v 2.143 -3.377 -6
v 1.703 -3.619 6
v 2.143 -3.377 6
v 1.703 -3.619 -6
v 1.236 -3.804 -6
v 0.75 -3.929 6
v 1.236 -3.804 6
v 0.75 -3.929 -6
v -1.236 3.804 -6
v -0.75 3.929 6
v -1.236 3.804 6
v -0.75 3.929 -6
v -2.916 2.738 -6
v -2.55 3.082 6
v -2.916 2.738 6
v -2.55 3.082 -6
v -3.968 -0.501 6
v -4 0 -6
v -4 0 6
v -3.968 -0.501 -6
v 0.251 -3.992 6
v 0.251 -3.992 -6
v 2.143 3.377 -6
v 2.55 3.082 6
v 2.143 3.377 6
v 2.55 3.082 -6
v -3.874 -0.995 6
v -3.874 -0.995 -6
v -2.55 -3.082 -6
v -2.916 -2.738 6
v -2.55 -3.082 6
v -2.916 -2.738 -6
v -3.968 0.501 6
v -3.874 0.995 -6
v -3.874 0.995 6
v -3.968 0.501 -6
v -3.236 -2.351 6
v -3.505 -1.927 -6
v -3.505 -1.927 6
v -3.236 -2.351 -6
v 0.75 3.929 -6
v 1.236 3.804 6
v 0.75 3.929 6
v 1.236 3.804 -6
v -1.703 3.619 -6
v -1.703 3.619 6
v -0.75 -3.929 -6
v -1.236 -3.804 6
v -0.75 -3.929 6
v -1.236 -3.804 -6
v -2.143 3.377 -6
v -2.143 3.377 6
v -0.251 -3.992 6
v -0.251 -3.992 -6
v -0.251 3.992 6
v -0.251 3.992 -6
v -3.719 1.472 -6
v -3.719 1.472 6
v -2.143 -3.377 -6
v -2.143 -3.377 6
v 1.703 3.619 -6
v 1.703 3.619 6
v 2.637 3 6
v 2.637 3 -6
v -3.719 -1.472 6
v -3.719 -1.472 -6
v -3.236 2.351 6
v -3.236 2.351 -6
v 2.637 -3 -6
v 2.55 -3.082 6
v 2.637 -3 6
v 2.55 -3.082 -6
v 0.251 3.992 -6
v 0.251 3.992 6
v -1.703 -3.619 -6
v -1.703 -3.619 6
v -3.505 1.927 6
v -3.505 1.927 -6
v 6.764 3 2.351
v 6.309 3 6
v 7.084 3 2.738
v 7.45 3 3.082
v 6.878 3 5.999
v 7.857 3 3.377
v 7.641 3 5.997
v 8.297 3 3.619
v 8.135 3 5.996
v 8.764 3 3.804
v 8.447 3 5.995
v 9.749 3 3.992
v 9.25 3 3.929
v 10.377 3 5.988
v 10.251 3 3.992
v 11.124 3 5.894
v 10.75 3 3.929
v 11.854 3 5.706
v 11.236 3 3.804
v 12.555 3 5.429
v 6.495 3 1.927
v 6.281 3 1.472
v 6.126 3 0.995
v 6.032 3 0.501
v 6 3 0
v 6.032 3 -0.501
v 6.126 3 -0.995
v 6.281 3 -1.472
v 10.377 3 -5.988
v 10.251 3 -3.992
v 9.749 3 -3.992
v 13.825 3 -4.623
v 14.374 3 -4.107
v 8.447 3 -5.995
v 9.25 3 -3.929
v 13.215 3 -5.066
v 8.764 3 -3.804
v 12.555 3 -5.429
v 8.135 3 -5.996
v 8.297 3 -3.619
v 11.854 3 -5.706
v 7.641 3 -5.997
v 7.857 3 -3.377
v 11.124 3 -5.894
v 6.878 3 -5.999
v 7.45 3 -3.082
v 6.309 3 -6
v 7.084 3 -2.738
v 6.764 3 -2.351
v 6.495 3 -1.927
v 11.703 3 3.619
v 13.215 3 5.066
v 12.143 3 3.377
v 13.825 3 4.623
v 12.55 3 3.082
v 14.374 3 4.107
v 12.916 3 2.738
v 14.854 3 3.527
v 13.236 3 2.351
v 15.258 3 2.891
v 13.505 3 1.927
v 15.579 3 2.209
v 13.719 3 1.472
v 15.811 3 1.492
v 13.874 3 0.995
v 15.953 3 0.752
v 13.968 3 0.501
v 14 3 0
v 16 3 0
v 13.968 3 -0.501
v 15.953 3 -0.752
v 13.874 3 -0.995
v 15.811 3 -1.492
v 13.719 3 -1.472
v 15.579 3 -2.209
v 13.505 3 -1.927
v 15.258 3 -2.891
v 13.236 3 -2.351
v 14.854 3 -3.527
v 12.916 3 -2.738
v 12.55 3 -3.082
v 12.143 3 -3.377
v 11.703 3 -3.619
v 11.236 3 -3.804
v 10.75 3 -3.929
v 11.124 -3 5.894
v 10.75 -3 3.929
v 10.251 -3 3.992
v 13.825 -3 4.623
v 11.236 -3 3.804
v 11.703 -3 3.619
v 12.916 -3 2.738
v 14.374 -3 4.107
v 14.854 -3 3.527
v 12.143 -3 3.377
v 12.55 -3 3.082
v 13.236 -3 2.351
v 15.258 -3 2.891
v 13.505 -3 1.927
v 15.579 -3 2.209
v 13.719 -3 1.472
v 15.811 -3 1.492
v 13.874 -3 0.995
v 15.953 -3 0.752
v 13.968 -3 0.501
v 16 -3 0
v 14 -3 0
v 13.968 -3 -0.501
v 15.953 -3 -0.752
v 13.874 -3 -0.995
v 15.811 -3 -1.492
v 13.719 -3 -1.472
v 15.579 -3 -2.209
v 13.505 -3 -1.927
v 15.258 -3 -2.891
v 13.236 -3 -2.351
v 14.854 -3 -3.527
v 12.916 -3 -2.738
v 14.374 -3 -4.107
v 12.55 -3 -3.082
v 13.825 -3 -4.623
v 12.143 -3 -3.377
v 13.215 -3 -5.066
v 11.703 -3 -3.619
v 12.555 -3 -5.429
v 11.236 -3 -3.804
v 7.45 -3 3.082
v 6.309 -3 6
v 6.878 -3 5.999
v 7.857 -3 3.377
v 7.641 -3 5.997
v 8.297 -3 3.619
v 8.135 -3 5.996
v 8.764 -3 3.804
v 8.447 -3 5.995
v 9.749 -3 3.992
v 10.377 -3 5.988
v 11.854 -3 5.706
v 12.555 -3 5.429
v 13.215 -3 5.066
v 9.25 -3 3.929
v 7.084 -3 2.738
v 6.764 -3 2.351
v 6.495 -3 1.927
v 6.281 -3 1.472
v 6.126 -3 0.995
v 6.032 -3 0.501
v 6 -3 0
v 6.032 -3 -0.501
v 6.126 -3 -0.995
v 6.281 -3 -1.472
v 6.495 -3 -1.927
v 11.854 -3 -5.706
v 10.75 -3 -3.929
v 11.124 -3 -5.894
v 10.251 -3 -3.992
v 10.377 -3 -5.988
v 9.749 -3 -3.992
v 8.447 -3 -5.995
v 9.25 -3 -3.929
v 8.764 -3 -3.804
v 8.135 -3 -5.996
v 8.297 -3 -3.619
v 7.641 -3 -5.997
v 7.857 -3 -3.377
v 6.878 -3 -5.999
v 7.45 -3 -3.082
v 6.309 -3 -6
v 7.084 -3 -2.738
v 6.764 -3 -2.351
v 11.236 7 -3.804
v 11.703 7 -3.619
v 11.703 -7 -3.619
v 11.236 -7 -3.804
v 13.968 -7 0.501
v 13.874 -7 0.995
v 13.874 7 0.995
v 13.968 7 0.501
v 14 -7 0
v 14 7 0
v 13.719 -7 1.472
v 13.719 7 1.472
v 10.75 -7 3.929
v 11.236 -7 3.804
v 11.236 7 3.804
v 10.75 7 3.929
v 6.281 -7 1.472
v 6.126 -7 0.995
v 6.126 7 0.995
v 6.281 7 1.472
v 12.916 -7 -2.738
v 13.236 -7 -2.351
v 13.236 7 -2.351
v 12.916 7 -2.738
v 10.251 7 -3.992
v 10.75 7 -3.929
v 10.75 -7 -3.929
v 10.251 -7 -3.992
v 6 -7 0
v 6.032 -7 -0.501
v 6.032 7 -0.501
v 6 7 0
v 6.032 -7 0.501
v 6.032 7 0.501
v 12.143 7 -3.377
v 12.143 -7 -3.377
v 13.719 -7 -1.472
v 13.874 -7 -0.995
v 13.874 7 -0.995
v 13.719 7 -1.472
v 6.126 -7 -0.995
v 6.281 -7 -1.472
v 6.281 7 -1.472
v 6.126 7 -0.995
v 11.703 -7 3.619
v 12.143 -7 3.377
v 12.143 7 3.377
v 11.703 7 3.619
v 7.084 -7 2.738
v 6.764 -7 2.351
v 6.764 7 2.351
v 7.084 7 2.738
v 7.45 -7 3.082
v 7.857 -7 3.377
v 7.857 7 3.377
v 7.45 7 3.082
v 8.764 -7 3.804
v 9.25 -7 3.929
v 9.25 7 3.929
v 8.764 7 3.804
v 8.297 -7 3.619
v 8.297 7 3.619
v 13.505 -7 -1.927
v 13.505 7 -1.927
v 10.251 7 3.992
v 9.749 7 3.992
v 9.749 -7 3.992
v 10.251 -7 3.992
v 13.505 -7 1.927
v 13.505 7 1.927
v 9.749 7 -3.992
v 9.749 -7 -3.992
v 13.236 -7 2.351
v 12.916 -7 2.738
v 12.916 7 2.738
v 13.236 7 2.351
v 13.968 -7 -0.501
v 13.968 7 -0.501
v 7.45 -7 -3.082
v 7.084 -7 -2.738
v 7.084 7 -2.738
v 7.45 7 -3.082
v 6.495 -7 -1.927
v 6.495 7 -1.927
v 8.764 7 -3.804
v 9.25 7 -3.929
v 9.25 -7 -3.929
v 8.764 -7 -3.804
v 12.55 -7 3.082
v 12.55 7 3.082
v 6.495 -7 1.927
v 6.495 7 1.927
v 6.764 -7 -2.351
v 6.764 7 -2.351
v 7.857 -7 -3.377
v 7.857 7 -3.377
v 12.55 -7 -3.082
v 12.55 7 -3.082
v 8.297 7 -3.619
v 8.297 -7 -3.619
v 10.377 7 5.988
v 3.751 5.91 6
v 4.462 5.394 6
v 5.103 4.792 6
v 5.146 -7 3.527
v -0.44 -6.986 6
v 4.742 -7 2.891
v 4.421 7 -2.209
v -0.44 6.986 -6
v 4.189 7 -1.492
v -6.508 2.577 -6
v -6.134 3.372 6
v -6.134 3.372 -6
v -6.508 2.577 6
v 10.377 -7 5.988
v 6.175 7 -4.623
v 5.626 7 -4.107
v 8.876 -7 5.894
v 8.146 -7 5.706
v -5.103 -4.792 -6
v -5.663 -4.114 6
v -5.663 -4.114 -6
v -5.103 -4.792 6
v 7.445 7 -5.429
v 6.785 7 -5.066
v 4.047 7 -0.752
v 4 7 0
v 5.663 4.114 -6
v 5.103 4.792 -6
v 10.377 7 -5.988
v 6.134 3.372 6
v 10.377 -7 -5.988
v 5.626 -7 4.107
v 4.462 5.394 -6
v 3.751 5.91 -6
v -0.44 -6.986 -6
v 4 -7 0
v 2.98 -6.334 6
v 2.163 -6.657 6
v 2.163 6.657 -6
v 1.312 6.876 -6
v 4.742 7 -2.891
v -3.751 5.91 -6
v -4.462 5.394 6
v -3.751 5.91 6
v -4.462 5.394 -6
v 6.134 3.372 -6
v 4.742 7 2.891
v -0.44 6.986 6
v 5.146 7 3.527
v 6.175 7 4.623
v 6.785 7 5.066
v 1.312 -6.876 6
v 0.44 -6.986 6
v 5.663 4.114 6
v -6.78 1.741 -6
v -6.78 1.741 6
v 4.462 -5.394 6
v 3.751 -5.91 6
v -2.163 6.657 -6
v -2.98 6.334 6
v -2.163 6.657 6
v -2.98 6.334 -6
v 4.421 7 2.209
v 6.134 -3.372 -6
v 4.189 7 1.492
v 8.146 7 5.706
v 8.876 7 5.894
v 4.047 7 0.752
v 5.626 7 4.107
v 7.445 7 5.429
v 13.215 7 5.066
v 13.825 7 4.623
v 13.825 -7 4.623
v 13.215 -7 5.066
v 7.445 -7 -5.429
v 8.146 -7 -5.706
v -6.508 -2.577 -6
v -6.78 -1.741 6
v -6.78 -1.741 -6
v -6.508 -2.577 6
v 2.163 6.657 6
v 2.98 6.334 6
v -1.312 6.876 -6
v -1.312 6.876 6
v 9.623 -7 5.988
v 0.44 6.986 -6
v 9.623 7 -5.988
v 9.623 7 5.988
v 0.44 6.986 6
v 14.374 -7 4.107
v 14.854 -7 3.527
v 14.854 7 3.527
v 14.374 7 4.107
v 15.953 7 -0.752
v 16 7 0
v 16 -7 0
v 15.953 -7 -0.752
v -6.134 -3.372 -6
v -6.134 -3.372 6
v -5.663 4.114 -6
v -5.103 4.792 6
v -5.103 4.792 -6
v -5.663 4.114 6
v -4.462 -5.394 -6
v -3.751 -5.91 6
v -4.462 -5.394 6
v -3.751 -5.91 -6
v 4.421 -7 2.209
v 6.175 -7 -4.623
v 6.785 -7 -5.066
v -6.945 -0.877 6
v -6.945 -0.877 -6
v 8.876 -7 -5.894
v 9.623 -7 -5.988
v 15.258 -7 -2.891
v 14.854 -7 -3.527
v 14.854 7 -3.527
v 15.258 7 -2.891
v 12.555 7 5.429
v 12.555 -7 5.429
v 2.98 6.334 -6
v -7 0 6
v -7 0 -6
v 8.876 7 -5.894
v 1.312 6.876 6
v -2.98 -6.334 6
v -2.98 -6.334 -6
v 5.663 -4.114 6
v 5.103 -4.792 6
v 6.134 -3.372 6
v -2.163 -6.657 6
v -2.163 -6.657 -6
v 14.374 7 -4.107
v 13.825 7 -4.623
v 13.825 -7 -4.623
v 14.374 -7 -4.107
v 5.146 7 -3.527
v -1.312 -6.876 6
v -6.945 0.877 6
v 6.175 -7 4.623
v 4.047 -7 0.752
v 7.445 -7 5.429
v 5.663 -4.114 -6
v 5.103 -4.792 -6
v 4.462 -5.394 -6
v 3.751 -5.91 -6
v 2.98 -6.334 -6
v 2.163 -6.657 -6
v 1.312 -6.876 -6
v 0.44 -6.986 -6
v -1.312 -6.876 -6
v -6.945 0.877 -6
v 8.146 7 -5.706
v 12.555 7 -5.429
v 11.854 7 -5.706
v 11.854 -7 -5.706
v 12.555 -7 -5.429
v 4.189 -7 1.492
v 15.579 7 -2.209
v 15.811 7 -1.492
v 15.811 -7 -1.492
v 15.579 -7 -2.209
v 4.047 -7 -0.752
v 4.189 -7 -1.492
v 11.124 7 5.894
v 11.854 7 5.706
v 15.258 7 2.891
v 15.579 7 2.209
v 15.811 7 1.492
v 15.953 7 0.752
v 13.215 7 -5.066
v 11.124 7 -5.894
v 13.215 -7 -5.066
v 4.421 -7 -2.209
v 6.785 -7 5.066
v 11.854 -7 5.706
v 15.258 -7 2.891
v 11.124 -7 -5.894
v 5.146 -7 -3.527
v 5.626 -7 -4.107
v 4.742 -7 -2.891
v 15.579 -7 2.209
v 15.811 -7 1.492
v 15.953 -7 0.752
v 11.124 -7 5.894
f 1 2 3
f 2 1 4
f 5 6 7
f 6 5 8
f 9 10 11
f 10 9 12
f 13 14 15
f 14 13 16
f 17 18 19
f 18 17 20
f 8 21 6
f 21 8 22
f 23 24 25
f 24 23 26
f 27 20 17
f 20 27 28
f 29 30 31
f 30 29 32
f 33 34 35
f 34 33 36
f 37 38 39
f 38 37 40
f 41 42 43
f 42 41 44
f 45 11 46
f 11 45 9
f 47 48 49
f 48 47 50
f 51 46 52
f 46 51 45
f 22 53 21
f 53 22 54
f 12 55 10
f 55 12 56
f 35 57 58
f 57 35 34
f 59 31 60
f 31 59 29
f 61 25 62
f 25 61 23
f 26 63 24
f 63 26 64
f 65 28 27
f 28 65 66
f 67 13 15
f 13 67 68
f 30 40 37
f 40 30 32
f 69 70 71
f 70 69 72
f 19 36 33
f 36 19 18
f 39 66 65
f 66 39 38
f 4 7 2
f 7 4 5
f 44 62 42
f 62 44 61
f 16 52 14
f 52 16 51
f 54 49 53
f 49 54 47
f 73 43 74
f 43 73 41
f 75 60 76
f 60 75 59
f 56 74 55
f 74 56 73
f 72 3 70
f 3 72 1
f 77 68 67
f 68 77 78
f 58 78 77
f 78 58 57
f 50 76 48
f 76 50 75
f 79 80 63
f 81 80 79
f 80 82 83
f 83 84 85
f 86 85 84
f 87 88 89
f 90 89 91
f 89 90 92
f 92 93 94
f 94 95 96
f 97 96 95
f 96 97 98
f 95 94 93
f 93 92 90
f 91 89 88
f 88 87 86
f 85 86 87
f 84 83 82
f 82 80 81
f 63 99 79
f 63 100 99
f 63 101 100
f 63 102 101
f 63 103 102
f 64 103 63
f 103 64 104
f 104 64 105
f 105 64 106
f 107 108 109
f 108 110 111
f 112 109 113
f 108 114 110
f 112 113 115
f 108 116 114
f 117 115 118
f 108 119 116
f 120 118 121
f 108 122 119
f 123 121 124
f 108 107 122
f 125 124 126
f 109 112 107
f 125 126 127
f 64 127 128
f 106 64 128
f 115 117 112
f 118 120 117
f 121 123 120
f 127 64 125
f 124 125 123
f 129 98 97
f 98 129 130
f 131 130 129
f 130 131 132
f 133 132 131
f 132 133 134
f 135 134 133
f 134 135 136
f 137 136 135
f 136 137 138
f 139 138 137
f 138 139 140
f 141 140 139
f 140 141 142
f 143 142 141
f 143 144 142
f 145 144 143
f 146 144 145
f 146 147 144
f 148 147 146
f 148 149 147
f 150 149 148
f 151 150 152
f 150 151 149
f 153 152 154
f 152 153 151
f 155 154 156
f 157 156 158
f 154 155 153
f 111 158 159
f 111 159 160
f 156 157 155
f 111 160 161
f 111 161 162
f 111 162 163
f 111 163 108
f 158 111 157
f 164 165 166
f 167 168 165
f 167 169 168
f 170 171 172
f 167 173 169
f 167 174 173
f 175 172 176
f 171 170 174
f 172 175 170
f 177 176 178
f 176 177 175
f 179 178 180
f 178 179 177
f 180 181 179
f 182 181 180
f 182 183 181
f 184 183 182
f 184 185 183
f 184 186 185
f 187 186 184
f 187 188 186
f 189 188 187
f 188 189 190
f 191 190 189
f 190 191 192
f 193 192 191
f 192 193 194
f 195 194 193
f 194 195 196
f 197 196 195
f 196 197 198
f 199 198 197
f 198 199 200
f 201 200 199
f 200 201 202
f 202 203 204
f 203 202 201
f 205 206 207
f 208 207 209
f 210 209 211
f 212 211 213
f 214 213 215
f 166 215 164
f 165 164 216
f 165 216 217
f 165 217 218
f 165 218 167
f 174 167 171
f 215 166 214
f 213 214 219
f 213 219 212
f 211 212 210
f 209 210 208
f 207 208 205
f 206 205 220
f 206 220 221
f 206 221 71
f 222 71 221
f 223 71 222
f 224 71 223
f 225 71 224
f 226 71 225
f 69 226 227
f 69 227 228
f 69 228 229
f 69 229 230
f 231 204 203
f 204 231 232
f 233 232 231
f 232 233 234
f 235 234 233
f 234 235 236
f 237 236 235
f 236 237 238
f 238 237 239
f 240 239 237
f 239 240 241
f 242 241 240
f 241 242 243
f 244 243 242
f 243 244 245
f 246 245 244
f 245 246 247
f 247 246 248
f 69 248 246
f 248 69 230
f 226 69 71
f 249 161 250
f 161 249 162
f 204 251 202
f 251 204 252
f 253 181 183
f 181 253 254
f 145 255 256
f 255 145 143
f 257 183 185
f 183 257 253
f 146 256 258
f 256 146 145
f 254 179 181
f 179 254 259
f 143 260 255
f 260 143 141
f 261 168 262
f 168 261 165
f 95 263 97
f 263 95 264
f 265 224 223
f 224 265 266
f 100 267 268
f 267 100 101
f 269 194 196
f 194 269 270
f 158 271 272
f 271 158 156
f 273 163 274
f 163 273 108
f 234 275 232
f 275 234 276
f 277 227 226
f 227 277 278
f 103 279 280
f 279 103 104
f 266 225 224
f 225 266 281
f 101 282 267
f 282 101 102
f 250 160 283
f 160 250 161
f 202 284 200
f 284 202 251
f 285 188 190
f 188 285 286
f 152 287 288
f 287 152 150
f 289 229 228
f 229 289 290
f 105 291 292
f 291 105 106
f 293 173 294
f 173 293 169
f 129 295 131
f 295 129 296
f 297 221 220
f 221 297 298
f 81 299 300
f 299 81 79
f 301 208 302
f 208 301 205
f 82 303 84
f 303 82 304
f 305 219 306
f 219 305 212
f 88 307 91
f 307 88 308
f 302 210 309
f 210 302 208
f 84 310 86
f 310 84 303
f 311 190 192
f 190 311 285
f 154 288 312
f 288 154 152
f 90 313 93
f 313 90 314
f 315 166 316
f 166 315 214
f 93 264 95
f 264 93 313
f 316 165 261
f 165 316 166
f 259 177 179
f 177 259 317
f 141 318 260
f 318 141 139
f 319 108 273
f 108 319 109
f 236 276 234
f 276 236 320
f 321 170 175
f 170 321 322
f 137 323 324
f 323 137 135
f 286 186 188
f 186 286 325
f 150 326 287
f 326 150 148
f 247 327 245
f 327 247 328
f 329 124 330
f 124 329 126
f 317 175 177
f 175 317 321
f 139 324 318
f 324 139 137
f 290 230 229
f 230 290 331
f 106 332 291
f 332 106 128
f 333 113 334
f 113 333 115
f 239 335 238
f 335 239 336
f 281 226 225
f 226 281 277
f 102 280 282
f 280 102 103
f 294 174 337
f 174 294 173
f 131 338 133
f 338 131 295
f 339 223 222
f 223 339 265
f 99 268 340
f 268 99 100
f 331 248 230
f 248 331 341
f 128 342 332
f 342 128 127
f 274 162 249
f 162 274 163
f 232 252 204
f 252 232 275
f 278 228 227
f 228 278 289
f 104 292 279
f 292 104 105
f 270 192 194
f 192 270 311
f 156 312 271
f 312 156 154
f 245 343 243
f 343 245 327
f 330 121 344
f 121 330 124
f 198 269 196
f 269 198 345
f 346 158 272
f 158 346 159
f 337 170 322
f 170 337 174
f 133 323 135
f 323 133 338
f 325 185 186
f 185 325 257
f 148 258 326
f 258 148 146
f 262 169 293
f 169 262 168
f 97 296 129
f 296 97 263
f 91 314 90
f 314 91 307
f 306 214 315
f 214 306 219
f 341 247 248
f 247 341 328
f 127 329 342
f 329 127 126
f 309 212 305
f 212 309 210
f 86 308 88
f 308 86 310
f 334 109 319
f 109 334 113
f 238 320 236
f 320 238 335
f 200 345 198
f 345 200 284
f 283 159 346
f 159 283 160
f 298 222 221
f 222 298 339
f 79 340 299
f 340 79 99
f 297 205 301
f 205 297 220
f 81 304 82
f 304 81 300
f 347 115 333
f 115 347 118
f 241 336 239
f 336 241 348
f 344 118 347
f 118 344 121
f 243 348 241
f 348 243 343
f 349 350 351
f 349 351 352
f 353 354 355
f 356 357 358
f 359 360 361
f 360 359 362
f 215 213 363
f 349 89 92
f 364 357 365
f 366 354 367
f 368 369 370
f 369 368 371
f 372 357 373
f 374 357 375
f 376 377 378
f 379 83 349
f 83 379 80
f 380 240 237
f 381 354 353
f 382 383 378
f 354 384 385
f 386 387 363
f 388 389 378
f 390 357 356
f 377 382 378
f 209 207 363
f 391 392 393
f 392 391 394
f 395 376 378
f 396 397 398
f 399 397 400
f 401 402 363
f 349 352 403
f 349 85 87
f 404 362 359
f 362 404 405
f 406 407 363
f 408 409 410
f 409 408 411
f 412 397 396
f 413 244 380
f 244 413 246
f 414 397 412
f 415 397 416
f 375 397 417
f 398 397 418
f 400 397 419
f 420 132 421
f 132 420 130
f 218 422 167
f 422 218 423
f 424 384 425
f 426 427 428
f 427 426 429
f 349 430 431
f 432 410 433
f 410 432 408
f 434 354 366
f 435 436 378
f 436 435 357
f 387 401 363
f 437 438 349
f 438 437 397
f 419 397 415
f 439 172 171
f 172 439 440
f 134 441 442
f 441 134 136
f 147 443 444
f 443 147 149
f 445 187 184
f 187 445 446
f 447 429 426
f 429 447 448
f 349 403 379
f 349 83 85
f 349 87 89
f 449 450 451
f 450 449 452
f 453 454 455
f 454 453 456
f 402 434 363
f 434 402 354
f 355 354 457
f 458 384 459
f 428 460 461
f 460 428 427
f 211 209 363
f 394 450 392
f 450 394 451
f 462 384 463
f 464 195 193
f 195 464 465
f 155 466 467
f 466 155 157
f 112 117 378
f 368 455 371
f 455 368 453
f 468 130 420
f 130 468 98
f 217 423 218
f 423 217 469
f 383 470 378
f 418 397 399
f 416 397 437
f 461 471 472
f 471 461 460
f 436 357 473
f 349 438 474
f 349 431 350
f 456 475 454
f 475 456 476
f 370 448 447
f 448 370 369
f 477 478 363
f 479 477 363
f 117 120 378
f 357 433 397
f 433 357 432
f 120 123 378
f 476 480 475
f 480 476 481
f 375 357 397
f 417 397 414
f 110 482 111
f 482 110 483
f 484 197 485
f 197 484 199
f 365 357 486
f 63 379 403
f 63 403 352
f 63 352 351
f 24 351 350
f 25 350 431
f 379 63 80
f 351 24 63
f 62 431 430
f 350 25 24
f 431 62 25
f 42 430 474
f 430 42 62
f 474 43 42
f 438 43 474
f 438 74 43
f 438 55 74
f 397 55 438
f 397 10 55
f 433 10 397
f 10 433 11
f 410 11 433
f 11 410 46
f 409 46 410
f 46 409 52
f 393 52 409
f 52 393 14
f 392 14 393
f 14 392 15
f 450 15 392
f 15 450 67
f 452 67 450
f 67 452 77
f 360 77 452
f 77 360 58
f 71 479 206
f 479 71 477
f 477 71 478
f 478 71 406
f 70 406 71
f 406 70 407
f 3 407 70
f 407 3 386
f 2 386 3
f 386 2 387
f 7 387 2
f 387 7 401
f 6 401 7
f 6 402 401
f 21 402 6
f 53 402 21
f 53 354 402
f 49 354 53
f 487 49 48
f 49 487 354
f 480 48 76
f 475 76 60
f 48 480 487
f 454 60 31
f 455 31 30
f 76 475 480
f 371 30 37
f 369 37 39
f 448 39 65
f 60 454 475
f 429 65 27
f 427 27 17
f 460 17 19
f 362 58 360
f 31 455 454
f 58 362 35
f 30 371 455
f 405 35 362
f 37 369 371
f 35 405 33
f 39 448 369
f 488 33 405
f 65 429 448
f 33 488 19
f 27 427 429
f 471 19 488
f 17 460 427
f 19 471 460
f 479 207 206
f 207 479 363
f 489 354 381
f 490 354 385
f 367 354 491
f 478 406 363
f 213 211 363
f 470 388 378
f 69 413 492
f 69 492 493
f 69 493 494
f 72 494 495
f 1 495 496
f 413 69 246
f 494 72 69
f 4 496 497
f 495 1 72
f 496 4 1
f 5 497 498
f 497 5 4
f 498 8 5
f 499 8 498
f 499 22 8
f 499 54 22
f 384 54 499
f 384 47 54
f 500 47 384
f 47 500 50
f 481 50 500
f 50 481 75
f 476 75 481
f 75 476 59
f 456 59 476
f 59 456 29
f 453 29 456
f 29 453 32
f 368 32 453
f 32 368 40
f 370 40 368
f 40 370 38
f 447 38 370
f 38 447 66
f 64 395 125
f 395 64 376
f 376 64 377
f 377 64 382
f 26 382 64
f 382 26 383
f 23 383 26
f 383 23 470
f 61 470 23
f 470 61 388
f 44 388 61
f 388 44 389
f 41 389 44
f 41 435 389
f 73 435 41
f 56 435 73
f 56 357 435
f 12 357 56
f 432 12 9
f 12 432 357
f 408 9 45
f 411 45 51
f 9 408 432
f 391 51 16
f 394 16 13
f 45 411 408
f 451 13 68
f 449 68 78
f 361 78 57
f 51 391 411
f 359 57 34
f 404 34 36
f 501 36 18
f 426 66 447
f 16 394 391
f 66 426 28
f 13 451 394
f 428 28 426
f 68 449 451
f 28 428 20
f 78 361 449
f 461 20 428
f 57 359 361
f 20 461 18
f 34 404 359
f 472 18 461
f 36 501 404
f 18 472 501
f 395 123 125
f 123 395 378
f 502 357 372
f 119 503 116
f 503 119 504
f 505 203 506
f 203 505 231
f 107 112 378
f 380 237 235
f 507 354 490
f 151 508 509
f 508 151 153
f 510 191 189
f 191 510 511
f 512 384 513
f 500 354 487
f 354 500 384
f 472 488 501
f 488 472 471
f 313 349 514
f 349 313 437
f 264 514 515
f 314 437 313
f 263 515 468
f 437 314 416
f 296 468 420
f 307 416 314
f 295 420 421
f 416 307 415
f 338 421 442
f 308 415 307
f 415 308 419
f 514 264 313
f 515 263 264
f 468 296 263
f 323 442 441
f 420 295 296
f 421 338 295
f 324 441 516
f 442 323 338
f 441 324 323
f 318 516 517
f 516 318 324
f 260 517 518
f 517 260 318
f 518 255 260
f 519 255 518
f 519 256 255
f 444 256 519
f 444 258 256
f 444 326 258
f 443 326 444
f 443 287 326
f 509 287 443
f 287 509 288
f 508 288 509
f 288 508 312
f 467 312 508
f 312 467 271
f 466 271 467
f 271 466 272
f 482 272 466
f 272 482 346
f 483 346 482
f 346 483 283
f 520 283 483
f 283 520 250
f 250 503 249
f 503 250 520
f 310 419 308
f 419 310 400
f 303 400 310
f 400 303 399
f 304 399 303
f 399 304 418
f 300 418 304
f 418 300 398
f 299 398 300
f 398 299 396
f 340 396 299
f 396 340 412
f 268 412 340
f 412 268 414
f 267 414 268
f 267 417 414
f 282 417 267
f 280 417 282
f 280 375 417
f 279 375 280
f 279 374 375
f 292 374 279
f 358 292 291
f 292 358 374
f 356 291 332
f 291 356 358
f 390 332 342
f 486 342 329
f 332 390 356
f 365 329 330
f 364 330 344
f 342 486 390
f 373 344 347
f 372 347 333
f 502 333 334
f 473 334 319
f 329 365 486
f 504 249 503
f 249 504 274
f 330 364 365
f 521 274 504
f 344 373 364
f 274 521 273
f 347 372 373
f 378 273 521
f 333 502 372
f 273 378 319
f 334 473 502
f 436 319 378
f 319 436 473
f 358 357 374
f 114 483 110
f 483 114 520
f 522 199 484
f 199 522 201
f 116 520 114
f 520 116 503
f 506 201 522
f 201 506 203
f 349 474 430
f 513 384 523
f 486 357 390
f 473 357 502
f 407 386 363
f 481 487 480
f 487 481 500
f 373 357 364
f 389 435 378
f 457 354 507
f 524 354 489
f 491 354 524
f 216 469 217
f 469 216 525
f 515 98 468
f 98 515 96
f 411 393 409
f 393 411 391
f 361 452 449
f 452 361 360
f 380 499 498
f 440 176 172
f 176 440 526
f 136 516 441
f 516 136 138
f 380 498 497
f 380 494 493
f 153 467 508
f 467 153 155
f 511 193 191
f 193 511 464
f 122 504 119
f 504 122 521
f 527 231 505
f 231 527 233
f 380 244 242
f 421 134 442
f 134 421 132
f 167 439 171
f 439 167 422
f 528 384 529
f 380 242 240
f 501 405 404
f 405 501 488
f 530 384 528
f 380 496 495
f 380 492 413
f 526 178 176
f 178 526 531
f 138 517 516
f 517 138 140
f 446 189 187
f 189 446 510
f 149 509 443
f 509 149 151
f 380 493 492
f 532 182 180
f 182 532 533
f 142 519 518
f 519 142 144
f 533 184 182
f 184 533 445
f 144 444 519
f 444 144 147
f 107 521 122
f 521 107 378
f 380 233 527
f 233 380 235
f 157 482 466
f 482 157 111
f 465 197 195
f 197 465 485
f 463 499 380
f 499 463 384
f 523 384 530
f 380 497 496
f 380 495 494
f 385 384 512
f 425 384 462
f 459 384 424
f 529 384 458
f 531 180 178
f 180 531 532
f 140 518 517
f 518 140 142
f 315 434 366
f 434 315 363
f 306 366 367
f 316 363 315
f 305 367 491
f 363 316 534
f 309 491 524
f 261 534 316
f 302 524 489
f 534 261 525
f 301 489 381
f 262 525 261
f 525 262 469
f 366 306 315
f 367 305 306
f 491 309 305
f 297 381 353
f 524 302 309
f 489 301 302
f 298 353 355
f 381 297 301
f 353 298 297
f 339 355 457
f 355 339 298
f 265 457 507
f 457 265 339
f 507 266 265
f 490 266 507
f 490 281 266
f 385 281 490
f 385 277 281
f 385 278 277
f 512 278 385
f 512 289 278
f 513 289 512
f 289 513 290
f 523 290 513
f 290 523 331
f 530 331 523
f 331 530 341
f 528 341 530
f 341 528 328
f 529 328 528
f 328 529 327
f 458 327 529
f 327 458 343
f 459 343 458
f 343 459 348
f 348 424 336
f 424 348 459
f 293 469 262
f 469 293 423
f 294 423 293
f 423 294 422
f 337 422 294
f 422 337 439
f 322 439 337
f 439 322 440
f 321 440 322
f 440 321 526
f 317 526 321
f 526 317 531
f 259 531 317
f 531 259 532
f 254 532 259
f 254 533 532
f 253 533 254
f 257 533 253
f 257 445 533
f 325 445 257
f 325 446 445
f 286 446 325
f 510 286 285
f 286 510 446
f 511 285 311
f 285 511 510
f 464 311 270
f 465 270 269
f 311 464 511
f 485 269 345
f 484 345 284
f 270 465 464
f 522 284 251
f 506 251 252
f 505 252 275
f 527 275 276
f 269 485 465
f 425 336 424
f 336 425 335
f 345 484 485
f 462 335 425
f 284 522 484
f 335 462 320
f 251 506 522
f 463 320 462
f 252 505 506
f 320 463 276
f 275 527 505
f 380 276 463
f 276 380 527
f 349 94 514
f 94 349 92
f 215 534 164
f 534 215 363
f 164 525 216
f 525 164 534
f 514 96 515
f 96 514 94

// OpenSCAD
module rod_clam(diameter1, diameter2, length, width, thickness, span) {
  difference() {
      hull() {
      cylinder(h=width, r=diameter1/2+thickness, center=true);
      translate ([length, 0, 0]) rotate([90, 0, 0]) cylinder(h=diameter1+thickness*2, r=width/2, center=true);
      }
      union() {
        cylinder(h=width+2, r=diameter1/2, center=true);
	translate([(length+diameter1)/2, 0, 0]) cube([length+diameter1, span, width+2], center=true);
	translate([length, 0, 0]) rotate([90, 0, 0]) cylinder(h=diameter1+thickness*2+2, r=diameter2/2, center=true);
      }
  }
  
}

$fn=50;
rod_clam(8, 8, 10, 12, 3, 6);
